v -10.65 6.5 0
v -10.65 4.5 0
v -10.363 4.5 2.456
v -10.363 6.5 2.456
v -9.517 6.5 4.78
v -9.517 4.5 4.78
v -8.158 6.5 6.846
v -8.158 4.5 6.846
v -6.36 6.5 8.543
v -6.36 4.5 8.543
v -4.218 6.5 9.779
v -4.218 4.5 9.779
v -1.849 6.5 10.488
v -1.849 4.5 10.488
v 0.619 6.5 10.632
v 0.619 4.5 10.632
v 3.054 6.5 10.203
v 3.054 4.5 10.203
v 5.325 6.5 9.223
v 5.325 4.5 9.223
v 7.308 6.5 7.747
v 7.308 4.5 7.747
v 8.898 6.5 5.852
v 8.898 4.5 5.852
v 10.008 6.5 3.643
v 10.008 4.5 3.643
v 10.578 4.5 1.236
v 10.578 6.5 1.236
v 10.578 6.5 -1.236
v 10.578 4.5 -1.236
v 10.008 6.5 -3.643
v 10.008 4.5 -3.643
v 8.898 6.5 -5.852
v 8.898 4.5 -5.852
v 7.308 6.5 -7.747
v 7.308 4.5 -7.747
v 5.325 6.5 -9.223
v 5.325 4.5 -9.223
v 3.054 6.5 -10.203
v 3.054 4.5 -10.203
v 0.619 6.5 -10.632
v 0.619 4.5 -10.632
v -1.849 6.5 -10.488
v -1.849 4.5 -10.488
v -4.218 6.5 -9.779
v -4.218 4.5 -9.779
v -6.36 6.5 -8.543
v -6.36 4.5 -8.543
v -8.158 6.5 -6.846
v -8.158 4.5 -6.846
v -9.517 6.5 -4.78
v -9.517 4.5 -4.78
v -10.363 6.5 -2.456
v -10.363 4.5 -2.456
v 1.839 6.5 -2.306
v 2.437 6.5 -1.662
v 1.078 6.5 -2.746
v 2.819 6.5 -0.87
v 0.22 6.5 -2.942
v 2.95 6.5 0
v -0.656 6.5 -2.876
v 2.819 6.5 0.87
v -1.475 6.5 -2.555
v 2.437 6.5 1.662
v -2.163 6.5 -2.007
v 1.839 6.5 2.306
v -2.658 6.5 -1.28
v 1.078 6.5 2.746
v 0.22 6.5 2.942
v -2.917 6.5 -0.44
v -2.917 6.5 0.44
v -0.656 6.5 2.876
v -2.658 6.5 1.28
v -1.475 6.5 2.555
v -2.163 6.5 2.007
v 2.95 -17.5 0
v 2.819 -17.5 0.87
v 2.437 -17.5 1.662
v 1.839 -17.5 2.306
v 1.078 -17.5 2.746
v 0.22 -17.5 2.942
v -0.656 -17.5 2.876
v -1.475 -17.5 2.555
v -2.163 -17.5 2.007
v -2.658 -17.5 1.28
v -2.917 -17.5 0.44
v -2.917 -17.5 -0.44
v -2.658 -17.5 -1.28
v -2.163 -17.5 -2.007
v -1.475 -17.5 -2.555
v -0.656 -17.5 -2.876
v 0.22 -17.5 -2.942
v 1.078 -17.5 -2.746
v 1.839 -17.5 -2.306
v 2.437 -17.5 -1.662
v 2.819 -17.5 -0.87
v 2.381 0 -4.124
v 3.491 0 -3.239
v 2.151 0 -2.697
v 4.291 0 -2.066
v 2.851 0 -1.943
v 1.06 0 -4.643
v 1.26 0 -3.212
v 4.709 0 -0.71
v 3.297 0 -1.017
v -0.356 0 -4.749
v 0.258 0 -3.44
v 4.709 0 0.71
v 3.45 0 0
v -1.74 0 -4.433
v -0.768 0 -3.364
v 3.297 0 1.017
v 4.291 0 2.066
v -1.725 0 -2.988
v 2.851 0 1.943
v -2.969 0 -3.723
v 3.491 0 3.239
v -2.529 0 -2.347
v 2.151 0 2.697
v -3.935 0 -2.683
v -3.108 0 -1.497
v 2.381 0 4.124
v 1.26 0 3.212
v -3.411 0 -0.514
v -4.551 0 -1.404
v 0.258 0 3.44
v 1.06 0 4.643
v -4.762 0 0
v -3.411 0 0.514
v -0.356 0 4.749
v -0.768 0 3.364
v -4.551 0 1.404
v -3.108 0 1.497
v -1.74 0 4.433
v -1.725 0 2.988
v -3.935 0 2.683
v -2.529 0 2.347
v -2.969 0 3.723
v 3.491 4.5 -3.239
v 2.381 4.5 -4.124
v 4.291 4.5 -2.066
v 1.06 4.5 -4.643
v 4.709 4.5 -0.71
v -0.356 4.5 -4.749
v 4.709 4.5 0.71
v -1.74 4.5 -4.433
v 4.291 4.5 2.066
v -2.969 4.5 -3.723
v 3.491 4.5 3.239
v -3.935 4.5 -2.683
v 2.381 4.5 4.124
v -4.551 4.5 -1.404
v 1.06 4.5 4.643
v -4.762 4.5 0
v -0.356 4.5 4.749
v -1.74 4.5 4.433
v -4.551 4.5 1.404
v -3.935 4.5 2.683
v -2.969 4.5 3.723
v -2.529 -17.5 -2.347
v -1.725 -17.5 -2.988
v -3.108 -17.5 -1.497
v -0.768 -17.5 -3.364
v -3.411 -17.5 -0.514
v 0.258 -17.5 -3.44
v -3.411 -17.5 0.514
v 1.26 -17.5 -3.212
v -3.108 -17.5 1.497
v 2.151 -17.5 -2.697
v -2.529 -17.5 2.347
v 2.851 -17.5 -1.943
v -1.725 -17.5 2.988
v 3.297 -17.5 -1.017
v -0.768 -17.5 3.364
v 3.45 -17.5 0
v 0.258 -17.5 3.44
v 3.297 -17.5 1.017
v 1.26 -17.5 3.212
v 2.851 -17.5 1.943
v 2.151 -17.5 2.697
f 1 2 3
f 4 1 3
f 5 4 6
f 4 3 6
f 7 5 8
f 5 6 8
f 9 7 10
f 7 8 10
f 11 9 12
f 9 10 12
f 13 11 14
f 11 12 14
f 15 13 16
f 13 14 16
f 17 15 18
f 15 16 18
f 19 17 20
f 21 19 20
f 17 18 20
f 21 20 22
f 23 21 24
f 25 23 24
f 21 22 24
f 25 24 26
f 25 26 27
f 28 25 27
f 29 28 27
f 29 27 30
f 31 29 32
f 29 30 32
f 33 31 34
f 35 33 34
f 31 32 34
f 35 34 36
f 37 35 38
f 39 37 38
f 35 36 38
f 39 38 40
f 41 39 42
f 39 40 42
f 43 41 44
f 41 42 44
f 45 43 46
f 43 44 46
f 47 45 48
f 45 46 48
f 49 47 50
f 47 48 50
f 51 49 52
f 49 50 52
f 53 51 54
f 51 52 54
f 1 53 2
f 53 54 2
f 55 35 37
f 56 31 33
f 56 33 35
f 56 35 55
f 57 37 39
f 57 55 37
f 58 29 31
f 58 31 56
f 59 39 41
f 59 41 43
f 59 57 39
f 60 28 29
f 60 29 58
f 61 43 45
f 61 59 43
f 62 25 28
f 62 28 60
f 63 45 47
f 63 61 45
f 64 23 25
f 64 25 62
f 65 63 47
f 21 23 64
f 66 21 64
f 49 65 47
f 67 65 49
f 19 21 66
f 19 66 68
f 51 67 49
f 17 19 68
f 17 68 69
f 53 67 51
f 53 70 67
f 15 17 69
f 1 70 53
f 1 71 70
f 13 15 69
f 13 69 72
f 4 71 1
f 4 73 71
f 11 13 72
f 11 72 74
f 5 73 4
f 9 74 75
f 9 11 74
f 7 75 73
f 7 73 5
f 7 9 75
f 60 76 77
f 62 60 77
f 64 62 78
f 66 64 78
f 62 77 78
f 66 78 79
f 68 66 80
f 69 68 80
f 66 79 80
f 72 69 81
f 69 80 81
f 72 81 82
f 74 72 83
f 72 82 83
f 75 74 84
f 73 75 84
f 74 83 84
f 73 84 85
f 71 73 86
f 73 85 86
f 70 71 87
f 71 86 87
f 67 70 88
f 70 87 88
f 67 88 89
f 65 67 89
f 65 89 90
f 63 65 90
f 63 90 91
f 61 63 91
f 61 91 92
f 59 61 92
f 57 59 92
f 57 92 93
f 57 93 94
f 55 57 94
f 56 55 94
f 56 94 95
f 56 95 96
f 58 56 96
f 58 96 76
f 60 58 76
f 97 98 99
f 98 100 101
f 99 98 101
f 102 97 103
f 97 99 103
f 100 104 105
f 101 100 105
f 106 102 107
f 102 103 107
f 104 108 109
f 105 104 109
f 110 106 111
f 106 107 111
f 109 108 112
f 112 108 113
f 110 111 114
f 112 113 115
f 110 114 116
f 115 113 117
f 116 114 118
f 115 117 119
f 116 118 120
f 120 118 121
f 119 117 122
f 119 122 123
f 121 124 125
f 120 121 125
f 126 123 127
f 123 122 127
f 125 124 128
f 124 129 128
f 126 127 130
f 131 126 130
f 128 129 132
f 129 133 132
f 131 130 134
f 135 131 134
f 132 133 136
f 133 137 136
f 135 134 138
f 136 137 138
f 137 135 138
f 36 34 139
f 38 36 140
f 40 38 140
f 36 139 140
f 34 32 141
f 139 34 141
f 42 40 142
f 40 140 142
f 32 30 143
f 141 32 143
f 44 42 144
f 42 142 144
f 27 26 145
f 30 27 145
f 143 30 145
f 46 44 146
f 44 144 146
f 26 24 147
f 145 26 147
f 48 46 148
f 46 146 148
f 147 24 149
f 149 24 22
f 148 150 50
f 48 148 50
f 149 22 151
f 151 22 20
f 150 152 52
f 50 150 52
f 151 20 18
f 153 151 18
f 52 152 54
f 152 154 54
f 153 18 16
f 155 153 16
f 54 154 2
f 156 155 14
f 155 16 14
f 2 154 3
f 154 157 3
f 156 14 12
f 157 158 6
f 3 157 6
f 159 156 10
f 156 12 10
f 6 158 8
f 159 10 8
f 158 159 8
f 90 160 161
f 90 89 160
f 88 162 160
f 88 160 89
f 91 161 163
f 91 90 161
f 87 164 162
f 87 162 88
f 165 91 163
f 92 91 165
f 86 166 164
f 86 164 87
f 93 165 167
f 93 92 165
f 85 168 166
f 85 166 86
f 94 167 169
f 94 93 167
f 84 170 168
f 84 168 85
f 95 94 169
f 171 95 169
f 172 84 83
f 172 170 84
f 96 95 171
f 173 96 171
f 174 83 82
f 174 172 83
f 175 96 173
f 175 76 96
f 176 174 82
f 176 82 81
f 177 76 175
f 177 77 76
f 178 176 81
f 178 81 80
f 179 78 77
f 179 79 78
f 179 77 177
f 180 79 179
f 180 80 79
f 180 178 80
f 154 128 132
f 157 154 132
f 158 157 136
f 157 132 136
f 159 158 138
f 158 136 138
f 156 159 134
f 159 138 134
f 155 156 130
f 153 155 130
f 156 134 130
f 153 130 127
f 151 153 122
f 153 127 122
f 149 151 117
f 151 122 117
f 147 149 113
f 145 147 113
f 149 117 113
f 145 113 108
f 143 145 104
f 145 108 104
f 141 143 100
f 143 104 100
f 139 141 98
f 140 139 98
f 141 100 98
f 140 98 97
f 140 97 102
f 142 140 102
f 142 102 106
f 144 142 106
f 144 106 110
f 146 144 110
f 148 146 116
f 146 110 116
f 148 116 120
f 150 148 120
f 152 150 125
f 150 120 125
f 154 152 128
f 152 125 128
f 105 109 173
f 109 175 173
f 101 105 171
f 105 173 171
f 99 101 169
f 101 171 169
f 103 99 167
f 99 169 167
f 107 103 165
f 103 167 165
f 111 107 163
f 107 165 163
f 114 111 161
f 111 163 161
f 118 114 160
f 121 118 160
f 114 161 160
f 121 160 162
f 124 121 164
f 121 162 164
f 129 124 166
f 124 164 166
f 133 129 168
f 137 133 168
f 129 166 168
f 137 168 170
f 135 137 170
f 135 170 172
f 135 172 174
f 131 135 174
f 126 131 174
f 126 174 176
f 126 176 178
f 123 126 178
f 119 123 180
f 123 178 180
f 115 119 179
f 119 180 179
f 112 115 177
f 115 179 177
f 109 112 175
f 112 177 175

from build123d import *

# Parameters (mm, degrees)
F0_R      = 3.45
F1_DEPTH  = 17.5
F1_FACE_R = 3.45
F3_DEPTH  = 4.5
F2_R      = 4.7625
F2_R_2    = 3.45
F4_DEPTH  = 4.5
F5_R      = 10.65
F5_R_2    = 4.7625
F6_DEPTH  = 2
F7_R      = 2.95
F8_DEPTH  = 28


with BuildPart() as f1:
    # F0 (on Front) → F1 (new body)
    with BuildSketch(Plane.XZ):
        Circle(F0_R)
    extrude(amount=F1_DEPTH)

    # F1_face (on face) → F3 (join)
    with BuildSketch(Plane(origin=(0, 0, 0), x_dir=(1, 0, 0), z_dir=(0, 1, 0))):
        Circle(F1_FACE_R)
    extrude(amount=F3_DEPTH)

    # F2 (on face) → F4 (join)
    with BuildSketch(Plane(origin=(0, 0, 0), x_dir=(-1, 0, 0), z_dir=(0, 1, 0))):
        Circle(F2_R)
        Circle(F2_R_2, mode=Mode.SUBTRACT)
    extrude(amount=F4_DEPTH)

    # F5 (on face) → F6 (join)
    with BuildSketch(Plane(origin=(0, 4.5, 0), x_dir=(-1, 0, 0), z_dir=(0, 1, 0))):
        Circle(F5_R)
        Circle(F5_R_2, mode=Mode.SUBTRACT)
        Circle(F5_R_2)
    extrude(amount=F6_DEPTH)

    # F7 (on face) → F8 (cut)
    with BuildSketch(Plane.XZ.offset(17.5)):
        Circle(F7_R)
    extrude(amount=-F8_DEPTH, mode=Mode.SUBTRACT)


solid = f1.part
